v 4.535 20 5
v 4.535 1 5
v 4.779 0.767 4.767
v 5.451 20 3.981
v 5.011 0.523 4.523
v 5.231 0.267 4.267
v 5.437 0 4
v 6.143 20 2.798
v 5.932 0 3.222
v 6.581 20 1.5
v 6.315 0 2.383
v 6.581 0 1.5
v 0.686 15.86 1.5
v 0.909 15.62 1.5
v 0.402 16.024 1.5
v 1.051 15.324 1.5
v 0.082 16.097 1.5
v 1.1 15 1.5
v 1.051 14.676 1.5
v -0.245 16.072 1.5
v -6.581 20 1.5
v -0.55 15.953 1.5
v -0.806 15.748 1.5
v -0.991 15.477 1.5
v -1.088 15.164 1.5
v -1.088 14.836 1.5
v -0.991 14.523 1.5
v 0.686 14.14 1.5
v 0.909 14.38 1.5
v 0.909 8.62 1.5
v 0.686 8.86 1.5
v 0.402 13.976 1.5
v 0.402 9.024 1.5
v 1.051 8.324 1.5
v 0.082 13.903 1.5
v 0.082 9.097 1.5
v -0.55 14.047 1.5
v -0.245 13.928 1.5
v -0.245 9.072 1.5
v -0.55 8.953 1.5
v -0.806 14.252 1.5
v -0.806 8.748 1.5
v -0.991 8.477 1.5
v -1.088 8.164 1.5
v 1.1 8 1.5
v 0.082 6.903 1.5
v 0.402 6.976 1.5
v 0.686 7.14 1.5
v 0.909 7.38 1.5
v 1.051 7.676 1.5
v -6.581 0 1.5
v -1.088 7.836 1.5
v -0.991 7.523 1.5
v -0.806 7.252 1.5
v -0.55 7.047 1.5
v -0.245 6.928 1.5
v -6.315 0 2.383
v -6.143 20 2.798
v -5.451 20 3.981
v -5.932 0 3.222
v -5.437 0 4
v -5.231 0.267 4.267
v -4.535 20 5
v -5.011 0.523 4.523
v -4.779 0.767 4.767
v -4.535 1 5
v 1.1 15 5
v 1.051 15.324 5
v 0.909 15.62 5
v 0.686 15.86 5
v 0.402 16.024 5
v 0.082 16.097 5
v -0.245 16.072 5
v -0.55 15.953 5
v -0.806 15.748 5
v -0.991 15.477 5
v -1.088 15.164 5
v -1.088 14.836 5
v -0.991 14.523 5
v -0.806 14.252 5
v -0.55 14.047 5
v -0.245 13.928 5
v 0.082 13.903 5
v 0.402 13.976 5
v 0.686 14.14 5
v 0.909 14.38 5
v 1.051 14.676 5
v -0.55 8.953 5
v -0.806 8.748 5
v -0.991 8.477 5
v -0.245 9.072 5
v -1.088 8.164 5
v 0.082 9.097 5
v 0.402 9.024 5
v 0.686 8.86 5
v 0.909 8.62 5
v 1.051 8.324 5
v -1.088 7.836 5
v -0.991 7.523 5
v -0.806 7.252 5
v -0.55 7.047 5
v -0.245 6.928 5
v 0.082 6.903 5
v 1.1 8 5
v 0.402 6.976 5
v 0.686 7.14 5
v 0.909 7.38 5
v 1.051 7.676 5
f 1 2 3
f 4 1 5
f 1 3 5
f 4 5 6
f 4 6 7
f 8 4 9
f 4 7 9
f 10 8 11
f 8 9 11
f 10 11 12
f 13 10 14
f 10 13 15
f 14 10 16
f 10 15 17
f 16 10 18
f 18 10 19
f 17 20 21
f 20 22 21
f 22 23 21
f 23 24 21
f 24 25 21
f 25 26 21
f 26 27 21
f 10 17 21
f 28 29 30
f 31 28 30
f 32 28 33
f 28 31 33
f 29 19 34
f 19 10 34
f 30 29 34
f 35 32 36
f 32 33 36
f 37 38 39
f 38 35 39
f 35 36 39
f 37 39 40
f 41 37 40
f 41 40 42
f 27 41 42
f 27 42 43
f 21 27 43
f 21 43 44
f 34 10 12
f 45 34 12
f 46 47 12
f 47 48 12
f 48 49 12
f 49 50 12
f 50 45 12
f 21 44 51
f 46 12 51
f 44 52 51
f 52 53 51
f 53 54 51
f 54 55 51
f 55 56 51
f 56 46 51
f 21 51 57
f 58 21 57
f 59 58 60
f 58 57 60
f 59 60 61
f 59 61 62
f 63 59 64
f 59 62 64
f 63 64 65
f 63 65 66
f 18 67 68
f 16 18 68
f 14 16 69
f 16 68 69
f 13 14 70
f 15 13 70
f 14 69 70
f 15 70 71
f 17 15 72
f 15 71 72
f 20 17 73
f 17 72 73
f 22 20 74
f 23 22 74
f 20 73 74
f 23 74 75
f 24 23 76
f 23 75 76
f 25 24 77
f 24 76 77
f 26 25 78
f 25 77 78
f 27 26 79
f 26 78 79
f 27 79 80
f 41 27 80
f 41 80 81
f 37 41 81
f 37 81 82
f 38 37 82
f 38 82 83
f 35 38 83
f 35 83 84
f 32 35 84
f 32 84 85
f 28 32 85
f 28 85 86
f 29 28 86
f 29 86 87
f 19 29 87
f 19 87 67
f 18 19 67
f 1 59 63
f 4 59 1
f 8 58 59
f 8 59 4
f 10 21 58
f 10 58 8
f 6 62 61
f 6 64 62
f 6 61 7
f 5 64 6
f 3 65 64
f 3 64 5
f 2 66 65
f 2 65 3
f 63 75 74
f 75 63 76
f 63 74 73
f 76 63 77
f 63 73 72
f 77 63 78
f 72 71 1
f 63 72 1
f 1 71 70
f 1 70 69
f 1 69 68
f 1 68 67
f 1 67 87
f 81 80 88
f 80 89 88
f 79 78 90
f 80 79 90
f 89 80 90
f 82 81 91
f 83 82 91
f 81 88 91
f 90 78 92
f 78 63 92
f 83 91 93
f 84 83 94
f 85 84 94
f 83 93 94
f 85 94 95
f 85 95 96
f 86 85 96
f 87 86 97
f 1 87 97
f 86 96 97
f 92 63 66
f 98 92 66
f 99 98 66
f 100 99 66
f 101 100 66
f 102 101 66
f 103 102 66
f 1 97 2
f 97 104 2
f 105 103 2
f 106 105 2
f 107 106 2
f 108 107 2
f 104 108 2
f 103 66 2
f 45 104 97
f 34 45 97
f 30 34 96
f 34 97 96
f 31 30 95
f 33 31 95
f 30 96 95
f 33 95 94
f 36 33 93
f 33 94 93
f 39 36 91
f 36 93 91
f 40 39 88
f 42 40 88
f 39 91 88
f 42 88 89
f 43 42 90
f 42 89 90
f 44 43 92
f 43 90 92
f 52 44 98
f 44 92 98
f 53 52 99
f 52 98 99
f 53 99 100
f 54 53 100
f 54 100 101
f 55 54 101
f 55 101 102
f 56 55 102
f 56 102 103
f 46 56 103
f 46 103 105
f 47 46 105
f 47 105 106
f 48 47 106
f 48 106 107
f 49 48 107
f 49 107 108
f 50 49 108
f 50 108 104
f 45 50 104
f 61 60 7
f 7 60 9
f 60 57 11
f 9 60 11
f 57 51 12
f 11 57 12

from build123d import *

# Parameters (mm, degrees)
EXTRUDE_1_DEPTH     = 20
SKETCH_3_R          = 1.1
CUT_EXTRUDE_1_DEPTH = 20
CHAMFER_1_SIZE      = 1


with BuildPart() as part:
    # 草图2 → 凸台-拉伸1 (new body)
    with BuildSketch(Plane(origin=(0, 0, 0), x_dir=(1, 0, 0), z_dir=(0, 1, 0))):
        with BuildLine():
            Line((6.581223291, -1.5), (-6.581223291, -1.5))
            ThreePointArc((-6.581223291, -1.5), (-5.826905037, -3.40729771), (-4.534589287, -5))
            Line((-4.534589287, -5), (4.534589287, -5))
            ThreePointArc((4.534589287, -5), (5.826905037, -3.40729771), (6.581223291, -1.5))
        make_face()
    extrude(amount=EXTRUDE_1_DEPTH)

    # 草图3 → 切除-拉伸1 (cut)
    with BuildSketch(Plane.XY.offset(5)):
        with Locations((0, 15)):
            Circle(SKETCH_3_R)
        with Locations((0, 8)):
            Circle(SKETCH_3_R)
    extrude(amount=-CUT_EXTRUDE_1_DEPTH, mode=Mode.SUBTRACT)

    # 倒角1
    chamfer_1_edges = [part.edges().sort_by_distance(p)[0] for p in [
        (0, 0, 5),
    ]]
    chamfer(chamfer_1_edges, length=CHAMFER_1_SIZE)


solid = part.part
